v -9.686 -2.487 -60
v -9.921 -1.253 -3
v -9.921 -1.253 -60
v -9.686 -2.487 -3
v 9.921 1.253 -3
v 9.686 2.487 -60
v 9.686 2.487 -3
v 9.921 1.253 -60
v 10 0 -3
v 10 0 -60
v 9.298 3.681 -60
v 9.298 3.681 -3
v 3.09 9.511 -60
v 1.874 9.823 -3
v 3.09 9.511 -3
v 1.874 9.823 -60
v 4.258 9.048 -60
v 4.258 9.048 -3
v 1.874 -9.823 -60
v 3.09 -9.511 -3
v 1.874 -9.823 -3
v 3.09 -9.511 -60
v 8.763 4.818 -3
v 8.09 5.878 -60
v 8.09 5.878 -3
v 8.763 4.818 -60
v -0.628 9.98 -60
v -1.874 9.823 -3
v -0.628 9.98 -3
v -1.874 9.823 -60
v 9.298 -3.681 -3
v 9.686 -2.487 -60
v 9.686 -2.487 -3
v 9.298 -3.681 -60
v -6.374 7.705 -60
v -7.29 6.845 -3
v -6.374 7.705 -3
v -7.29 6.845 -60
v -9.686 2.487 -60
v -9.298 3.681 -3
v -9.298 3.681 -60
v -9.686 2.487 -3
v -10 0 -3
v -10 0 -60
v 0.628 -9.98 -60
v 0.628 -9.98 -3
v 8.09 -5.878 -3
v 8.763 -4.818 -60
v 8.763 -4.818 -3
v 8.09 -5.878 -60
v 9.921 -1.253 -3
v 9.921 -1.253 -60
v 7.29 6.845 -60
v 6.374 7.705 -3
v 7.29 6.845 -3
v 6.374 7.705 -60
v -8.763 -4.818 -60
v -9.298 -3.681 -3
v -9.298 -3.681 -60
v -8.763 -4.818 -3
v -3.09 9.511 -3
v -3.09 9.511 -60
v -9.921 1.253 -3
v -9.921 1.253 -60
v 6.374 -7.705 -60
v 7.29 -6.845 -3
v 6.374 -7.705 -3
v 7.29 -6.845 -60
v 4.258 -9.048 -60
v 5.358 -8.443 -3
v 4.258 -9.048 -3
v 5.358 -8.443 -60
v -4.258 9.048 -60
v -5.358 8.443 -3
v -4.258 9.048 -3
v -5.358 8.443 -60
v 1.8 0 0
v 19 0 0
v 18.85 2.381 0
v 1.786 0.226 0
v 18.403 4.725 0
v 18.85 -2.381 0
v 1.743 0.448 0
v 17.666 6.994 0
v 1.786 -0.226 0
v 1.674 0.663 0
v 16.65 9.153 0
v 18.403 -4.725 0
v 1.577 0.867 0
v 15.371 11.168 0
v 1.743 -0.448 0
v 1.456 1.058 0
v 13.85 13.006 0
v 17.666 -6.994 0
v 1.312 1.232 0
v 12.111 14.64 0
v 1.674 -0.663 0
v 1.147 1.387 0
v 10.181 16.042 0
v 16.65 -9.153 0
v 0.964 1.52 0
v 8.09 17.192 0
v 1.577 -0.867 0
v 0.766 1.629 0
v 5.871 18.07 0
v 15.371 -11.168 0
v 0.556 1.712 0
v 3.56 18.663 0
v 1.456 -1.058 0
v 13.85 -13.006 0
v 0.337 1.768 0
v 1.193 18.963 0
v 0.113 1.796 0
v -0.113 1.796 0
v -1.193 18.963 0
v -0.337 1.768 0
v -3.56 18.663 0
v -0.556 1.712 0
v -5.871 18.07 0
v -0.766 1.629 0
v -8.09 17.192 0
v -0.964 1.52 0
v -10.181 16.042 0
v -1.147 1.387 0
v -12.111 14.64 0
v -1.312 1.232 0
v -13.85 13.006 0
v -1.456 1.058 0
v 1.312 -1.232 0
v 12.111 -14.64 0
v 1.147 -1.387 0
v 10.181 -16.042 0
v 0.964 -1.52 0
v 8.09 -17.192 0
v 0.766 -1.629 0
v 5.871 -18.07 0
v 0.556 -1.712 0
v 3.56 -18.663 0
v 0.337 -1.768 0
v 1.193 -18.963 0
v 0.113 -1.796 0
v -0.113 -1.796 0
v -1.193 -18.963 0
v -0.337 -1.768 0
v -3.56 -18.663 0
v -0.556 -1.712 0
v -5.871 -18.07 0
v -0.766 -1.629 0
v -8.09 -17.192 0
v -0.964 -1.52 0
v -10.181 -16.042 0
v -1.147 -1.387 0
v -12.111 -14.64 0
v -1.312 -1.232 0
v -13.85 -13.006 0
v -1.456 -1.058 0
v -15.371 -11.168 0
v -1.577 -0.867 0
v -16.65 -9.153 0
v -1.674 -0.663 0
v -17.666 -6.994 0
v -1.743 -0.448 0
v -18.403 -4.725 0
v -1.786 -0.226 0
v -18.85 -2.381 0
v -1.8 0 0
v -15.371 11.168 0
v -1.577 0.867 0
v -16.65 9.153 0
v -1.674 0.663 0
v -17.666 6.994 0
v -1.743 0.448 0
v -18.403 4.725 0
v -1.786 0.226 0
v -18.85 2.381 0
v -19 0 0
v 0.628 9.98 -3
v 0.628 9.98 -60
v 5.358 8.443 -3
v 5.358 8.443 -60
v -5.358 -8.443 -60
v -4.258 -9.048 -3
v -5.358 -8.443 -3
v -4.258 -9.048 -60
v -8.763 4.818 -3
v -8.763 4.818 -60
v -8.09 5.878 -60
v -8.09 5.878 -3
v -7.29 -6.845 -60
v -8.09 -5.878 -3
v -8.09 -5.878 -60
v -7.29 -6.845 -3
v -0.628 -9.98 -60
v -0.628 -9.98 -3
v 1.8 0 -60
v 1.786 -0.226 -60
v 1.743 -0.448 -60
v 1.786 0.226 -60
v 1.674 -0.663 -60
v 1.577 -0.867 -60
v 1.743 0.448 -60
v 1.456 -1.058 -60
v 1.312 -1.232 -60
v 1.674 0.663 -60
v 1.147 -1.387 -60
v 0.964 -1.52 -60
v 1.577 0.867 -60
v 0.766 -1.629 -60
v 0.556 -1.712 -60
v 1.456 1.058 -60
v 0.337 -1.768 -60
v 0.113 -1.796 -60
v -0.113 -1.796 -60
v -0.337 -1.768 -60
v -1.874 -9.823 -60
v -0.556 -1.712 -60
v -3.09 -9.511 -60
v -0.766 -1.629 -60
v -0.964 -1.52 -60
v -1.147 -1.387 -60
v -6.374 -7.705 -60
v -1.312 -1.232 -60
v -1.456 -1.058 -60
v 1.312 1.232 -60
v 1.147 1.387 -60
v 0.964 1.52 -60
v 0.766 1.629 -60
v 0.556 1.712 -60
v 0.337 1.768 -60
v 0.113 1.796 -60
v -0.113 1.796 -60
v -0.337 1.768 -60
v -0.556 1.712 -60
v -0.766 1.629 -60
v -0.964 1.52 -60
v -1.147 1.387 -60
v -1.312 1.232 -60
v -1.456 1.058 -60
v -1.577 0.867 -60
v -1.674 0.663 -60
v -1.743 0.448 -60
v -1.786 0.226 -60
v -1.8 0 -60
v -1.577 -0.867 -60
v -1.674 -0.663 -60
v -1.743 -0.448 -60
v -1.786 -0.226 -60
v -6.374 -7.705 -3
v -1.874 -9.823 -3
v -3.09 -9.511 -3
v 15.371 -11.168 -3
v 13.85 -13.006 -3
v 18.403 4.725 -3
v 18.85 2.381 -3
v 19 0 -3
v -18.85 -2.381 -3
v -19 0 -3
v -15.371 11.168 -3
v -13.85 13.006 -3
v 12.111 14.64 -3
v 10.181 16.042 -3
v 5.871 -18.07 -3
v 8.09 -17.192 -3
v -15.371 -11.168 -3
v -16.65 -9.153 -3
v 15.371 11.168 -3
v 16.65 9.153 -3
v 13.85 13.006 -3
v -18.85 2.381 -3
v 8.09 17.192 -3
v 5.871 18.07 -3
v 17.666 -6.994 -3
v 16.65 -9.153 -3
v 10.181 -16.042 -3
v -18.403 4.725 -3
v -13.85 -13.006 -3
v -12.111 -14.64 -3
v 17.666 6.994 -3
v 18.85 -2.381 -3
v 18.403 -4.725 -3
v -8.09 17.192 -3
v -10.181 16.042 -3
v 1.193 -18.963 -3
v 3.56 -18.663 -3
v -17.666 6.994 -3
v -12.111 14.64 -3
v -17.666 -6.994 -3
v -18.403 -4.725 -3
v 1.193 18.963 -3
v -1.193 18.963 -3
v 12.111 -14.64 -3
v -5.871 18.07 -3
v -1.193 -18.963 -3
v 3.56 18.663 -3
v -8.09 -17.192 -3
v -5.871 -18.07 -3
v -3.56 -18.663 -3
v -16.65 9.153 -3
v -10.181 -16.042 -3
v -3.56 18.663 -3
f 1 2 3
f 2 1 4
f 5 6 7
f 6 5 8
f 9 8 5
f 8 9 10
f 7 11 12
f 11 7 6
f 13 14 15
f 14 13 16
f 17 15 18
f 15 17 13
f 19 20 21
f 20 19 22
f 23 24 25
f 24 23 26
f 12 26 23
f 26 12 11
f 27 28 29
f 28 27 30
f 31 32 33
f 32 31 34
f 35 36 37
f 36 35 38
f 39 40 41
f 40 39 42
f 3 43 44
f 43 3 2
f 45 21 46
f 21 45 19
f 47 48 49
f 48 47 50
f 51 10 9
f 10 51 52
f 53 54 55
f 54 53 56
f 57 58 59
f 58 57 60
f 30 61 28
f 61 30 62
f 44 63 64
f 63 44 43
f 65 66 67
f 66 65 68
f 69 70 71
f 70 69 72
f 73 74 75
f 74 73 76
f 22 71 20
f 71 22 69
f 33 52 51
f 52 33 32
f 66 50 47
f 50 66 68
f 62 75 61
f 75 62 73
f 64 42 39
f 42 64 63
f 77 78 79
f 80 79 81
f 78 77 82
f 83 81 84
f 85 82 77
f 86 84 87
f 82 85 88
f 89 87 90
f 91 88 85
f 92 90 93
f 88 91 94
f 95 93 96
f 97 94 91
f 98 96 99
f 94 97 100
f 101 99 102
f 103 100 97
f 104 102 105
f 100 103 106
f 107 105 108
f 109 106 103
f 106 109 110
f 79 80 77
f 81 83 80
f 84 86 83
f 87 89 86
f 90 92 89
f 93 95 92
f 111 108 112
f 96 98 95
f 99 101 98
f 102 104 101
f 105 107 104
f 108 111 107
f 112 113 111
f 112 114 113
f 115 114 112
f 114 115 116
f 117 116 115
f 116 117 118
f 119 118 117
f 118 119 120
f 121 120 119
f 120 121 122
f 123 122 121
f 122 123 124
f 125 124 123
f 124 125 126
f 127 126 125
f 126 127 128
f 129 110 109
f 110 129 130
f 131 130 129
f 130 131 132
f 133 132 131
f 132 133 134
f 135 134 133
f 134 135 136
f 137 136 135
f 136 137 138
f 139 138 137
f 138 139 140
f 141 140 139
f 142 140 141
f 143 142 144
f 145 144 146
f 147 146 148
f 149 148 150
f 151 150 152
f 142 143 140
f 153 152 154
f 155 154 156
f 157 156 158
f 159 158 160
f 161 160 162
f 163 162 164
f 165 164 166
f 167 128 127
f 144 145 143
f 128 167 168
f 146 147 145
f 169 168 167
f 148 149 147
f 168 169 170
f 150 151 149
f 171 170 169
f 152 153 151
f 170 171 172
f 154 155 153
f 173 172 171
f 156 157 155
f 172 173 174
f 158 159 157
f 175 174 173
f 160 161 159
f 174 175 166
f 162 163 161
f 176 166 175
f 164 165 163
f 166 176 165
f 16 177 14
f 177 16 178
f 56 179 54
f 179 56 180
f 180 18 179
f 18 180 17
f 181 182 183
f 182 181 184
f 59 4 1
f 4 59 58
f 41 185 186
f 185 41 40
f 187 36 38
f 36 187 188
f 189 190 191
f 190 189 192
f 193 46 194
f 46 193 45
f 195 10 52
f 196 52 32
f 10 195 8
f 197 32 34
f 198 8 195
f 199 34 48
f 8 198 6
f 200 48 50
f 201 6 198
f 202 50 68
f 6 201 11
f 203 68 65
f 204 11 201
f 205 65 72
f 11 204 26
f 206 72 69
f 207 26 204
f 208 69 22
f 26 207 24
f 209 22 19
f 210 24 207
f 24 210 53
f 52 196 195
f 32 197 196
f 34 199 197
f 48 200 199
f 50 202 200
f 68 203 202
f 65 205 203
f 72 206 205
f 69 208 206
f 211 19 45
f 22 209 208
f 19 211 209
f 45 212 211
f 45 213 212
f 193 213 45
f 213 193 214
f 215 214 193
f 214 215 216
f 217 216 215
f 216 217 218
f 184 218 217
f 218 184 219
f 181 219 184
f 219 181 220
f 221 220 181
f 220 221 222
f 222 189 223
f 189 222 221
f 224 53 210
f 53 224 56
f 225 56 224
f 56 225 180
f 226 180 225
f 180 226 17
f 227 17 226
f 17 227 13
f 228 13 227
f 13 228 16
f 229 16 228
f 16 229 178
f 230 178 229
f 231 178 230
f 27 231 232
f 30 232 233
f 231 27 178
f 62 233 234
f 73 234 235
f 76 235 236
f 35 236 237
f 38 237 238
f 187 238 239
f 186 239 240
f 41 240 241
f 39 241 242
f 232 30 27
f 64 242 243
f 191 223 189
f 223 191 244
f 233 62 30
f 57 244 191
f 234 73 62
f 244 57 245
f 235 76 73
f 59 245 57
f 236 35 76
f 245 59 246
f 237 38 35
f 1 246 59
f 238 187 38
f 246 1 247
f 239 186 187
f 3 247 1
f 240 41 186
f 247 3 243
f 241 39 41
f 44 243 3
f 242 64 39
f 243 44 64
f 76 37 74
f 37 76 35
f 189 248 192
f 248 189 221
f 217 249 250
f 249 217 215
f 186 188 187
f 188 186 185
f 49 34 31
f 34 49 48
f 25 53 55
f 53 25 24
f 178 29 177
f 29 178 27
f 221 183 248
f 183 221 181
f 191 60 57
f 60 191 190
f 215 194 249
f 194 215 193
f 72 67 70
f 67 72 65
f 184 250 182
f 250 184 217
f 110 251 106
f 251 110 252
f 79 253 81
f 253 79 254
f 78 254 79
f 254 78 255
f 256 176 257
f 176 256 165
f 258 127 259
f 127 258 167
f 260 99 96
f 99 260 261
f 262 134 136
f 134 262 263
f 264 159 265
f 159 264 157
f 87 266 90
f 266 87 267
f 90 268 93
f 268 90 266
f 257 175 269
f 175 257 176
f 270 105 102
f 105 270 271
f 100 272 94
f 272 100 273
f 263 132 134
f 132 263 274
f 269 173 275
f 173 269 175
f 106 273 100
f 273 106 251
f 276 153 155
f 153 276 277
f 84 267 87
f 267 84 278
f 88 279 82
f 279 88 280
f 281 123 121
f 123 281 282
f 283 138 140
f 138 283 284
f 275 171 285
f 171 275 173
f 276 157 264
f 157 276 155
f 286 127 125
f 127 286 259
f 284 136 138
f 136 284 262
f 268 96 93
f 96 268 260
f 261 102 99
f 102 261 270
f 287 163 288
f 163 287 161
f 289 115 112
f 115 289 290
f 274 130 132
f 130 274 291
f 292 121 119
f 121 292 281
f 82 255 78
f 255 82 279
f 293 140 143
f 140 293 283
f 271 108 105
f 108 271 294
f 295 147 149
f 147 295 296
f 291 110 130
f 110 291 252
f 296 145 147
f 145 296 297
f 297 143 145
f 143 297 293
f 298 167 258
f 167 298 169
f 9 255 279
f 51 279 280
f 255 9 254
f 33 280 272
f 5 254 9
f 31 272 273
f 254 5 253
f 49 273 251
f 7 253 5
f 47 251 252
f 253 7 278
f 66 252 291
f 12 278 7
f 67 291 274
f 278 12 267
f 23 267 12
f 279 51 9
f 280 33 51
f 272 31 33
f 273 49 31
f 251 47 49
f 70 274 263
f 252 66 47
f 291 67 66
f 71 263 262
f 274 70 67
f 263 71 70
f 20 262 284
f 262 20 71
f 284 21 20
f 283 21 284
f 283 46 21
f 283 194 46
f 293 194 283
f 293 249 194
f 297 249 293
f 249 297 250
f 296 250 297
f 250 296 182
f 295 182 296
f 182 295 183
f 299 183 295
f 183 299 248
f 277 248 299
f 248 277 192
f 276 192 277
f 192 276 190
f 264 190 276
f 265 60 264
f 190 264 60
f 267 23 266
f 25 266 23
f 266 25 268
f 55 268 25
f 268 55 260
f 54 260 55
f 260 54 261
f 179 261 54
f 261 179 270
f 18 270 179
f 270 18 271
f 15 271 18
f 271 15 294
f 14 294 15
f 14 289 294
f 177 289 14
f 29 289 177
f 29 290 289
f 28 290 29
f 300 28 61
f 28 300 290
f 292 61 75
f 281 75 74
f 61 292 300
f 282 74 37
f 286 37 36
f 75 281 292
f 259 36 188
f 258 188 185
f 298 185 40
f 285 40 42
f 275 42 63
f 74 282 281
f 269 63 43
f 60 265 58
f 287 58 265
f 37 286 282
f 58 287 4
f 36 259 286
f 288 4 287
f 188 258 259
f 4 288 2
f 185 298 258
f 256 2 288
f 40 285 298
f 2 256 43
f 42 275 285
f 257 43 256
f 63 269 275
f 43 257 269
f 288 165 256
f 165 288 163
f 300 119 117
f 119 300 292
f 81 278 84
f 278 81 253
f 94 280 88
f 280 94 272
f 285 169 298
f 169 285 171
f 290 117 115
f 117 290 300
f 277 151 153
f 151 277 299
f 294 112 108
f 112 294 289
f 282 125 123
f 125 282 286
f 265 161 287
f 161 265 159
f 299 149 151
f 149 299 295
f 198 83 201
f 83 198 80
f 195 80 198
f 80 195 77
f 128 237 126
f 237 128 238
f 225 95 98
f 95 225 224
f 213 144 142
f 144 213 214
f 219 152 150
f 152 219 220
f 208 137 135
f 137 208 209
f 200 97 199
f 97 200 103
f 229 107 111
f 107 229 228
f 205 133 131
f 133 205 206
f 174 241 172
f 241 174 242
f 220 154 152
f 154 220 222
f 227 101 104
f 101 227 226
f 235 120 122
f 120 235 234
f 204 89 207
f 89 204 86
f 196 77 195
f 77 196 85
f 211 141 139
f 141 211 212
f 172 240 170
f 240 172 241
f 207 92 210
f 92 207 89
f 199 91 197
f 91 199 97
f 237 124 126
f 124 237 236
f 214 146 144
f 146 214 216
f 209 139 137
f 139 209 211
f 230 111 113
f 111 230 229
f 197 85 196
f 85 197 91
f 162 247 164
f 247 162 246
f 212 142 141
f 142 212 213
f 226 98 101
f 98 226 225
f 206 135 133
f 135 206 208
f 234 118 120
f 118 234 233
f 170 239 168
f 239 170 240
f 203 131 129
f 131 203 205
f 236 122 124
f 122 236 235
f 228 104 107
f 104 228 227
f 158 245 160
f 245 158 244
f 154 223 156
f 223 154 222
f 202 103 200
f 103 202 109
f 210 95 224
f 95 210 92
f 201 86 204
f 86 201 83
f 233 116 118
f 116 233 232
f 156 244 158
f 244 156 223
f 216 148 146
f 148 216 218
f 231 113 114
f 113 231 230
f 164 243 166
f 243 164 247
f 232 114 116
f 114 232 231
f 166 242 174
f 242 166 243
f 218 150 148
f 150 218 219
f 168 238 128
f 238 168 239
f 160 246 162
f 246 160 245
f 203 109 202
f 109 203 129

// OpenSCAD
$fn = 50;


difference() {
	union() {
		translate(v = [0, 0, -60.0000000000]) {
			cylinder(h = 60, r = 10.0000000000);
		}
		translate(v = [0, 0, -3.0000000000]) {
			cylinder(h = 3, r = 19.0000000000);
		}
	}
	union() {
		#translate(v = [0, 0, -60]) {
			cylinder(h = 60, r = 1.8000000000);
		}
	}
}
